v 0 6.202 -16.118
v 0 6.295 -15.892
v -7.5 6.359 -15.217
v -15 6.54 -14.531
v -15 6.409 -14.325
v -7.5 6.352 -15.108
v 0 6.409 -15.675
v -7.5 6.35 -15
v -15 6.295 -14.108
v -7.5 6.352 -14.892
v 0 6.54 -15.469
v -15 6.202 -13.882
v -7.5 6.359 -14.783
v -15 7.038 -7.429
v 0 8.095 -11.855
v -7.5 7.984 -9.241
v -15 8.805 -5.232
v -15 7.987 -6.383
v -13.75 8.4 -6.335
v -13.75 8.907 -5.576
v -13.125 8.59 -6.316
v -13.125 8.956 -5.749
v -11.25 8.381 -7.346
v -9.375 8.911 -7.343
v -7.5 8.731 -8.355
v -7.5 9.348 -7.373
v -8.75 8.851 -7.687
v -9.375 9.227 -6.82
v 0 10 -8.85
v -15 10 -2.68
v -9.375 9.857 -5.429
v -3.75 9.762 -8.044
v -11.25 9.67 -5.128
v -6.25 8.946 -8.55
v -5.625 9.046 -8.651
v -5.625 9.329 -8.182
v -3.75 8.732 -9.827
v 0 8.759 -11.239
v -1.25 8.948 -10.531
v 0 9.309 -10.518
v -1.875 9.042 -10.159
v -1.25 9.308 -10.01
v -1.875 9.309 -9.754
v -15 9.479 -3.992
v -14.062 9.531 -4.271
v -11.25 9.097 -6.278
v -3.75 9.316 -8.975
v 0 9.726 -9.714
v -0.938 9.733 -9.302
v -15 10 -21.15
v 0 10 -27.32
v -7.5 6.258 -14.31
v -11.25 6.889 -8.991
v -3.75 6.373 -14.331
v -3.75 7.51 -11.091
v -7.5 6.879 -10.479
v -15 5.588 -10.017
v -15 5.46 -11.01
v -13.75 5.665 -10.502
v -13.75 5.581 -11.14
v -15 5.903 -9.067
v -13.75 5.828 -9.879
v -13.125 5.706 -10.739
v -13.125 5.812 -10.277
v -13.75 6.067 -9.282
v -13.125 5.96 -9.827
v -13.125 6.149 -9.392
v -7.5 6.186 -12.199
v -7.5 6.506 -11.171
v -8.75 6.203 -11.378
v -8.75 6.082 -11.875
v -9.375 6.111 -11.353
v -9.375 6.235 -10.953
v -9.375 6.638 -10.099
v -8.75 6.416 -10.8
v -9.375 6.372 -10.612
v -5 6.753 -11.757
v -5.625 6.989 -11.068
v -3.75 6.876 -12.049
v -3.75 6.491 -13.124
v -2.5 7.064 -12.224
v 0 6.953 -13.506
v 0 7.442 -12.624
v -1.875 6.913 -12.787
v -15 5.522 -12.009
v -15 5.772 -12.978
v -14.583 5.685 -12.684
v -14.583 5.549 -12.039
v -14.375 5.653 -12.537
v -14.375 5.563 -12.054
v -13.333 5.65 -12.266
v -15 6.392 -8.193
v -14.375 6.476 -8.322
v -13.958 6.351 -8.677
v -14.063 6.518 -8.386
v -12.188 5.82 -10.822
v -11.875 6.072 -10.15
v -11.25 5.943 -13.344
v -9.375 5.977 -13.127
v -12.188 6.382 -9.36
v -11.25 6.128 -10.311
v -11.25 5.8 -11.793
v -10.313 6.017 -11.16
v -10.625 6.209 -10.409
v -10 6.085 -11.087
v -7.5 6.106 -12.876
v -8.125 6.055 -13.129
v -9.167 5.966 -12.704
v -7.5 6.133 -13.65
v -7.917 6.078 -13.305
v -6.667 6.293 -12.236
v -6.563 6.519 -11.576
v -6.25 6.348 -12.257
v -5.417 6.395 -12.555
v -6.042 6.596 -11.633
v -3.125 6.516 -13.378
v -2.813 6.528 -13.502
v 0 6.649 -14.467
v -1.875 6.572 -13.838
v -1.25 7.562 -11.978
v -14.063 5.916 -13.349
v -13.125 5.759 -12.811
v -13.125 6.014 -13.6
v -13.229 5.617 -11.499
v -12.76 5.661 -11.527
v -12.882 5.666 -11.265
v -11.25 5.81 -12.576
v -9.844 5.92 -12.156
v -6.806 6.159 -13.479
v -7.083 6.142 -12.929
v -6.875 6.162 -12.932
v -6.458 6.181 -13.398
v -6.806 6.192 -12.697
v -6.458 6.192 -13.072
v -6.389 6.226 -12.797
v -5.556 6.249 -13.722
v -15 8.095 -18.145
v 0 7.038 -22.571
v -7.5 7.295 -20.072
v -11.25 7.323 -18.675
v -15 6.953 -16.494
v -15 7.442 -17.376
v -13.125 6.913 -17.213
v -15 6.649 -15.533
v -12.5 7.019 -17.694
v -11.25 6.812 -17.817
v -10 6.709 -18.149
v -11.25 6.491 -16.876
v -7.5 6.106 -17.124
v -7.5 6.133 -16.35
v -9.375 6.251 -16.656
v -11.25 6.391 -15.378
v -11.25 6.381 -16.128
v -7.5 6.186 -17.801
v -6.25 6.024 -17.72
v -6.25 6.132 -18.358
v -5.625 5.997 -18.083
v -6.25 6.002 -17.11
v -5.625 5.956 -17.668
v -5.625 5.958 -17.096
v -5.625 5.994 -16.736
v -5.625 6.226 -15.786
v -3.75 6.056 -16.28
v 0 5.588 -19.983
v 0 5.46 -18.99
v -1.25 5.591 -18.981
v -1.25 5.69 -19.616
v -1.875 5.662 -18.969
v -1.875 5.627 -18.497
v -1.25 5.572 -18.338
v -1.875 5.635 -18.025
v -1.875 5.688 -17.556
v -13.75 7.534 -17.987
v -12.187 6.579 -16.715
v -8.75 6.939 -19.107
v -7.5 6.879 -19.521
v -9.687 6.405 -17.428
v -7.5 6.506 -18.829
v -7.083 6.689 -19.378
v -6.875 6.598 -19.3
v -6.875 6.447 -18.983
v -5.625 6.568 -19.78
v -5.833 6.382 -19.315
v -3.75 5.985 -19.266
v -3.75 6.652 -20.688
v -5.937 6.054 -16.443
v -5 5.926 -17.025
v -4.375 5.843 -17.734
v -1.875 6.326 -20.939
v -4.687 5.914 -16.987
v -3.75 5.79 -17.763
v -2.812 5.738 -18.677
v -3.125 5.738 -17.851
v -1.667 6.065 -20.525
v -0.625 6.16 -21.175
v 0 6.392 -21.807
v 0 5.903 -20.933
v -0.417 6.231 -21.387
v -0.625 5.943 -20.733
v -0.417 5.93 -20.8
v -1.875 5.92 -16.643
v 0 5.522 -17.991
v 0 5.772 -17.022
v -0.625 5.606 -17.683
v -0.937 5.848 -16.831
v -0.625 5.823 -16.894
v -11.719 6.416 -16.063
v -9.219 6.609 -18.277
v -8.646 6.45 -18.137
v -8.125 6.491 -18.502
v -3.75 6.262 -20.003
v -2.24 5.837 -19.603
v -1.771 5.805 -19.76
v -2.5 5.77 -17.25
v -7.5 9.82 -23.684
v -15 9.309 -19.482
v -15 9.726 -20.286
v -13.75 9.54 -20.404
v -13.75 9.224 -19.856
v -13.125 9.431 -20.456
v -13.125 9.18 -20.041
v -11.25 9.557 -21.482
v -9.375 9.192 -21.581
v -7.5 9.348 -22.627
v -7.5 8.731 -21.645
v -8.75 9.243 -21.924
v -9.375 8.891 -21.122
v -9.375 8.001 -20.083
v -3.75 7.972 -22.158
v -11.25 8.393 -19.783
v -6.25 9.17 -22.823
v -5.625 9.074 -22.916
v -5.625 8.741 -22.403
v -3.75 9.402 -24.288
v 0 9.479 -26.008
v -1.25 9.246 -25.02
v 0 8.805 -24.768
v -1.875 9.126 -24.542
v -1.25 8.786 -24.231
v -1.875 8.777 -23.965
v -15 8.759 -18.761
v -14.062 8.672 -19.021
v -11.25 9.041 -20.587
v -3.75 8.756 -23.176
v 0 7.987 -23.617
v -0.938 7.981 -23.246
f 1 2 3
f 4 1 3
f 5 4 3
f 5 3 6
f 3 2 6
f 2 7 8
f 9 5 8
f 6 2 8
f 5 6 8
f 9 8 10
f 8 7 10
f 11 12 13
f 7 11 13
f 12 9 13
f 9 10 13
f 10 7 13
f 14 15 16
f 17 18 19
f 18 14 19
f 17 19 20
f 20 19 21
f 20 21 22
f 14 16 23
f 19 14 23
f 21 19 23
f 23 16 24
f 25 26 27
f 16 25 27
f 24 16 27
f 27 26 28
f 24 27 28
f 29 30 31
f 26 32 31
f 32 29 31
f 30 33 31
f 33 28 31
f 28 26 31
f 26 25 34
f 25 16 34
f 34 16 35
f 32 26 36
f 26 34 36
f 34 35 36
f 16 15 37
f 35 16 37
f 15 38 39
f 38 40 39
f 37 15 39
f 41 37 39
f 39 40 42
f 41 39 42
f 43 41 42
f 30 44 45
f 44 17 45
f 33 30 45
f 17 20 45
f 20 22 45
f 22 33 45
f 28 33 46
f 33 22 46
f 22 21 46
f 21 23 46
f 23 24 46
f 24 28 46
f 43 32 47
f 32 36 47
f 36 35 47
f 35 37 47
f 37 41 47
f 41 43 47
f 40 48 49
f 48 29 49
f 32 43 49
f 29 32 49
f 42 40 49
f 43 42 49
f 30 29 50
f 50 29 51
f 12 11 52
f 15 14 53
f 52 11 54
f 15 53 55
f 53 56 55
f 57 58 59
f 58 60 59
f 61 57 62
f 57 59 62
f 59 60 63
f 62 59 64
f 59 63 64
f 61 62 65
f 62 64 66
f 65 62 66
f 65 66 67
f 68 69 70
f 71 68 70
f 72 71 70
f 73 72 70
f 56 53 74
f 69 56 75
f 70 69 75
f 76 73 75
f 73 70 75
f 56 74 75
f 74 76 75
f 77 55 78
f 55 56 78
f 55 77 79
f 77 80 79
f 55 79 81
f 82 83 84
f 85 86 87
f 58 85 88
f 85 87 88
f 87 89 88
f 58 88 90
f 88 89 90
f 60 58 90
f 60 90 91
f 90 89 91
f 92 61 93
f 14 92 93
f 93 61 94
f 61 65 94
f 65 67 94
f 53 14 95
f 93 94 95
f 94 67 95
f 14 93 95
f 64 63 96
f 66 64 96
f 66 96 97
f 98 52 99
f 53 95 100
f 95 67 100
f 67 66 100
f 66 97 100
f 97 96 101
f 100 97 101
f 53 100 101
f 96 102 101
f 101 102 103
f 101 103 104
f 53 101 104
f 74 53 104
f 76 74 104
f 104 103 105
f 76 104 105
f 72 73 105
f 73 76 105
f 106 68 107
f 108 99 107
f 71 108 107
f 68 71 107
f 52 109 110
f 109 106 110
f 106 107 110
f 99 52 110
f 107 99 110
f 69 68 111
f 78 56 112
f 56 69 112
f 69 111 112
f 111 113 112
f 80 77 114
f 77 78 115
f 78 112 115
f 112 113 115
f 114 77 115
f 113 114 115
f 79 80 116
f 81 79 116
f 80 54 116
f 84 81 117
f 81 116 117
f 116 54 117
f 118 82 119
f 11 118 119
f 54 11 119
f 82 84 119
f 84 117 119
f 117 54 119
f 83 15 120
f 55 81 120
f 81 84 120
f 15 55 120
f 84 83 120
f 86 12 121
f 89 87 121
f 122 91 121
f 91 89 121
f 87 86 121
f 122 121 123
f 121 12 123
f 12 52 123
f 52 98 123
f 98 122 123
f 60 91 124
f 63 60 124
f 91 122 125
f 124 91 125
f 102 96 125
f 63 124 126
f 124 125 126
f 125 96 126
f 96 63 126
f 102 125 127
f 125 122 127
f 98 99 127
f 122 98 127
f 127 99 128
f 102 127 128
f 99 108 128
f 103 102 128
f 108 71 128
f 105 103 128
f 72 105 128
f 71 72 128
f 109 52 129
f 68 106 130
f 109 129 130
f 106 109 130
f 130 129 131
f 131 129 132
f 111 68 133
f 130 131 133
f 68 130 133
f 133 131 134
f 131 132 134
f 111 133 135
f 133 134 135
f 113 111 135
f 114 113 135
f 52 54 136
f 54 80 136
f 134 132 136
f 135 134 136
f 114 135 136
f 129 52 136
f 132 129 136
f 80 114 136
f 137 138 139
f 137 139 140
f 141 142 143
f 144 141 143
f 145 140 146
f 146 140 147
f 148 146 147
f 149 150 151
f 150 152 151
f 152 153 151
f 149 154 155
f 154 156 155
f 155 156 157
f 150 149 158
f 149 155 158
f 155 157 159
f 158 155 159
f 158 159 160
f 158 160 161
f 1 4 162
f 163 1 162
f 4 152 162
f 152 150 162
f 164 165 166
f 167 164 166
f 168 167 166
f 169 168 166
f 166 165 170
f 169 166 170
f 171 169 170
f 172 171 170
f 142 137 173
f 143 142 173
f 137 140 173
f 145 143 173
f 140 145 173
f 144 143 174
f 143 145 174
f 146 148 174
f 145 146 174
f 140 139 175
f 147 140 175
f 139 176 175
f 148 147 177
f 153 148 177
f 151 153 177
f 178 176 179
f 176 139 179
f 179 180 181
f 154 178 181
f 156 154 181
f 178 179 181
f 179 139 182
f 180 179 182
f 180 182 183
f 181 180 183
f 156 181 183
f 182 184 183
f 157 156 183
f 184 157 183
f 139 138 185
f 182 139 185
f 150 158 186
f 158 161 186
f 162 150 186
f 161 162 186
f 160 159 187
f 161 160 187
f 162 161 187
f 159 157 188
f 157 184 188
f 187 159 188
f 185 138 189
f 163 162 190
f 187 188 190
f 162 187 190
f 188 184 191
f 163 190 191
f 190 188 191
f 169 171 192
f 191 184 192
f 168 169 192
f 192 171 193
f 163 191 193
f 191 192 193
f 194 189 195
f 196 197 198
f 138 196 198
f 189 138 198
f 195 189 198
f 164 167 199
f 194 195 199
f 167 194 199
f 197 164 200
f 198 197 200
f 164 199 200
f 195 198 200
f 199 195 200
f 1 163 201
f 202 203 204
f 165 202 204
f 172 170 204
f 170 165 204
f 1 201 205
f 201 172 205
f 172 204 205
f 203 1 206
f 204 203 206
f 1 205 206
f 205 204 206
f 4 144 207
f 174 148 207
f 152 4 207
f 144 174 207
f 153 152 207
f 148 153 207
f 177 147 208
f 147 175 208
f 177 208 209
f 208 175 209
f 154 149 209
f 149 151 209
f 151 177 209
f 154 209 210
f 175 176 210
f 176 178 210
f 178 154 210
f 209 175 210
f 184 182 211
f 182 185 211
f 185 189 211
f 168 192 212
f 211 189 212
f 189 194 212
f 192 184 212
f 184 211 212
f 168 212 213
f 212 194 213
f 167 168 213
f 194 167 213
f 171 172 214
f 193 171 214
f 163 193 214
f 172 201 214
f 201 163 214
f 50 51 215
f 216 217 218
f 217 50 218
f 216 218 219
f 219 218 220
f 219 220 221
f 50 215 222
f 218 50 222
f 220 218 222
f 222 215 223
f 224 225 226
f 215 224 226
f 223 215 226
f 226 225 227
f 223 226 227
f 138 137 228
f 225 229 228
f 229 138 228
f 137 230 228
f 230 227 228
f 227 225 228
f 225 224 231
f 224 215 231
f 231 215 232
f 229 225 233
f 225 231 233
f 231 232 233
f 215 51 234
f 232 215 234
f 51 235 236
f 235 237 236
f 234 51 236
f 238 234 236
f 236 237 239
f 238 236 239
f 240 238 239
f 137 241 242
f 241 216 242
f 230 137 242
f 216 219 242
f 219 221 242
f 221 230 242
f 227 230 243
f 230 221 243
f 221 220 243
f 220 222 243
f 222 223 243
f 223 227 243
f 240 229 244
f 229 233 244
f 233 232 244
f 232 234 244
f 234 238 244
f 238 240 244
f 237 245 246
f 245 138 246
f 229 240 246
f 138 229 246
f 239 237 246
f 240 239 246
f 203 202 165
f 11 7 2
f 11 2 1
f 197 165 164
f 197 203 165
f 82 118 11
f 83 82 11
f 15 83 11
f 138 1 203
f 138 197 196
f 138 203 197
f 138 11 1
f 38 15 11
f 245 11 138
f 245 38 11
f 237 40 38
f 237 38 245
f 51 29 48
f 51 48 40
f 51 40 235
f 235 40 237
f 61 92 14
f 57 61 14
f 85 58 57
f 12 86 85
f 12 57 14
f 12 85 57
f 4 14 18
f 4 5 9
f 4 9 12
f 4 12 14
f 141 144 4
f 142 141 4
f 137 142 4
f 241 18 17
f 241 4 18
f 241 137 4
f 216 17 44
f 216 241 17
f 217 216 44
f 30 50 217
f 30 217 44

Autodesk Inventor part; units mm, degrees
ref_plane "YZ Plane" through (0, 0, 0) normal (1, 0, 0) x (0, 1, 0)
ref_plane "XZ Plane" through (0, 0, 0) normal (0, 1, 0) x (-1, 0, 0)
ref_plane "XY Plane" through (0, 0, 0) normal (0, 0, 1) x (1, 0, 0)
sketch "Sketch1" plane through (0, 0, 0) normal (0, 1, 0) x (-1, 0, 0)
  line L0 (0, 0) -> (15, 0)
  line L1 (15, 0) -> (15, -30)
  line L2 (15, -30) -> (0, -30)
  line L3 (0, -30) -> (0, 0)
  dimension "d0" = 15
  dimension "d1" = 30
extrude "Extrusion1" add sketch "Sketch1" along normal blind 10
sketch "Sketch5" plane through (0, 0, 0) normal (1, 0, 0) x (0, 0, -1)
  line L0 (30, 10) -> (0, 10)
  arc A0 (11.8554, 8.0947) -> (8.8495, 10) centre (7.6947, 4.8542) ccw
  arc A1 (11.8554, 8.0947) -> (15.4691, 6.5404) centre (15.5119, 11.6182) ccw
  arc A2 (15.4691, 6.5404) -> (16.1182, 6.2019) centre (17.0614, 8.802) ccw
  arc A3 (16.1182, 6.2019) -> (22.5713, 7.0384) centre (18.8148, 10.7083) ccw
  arc A4 (27.3203, 10) -> (22.5713, 7.0384) centre (31.0109, -1.2064) ccw
  line L1 (27.3203, 10) -> (8.8495, 10)
  point P0 (0, 0)
  point P1 (0, 0)
  dimension "d14" = 2.6797
  dimension "d15" = 8.8495
sketch "Sketch6" plane through (-15, 0, -30) normal (-1, 0, 0) x (0, 0, 1)
  line L0 (30, 10) -> (0, 10)
  arc A0 (11.8554, 8.0947) -> (8.8495, 10) centre (7.6947, 4.8542) ccw
  arc A1 (11.8554, 8.0947) -> (15.4691, 6.5404) centre (15.5119, 11.6182) ccw
  arc A2 (15.4691, 6.5404) -> (16.1182, 6.2019) centre (17.0614, 8.802) ccw
  arc A3 (16.1182, 6.2019) -> (22.5713, 7.0384) centre (18.8148, 10.7083) ccw
  arc A4 (27.3203, 10) -> (22.5713, 7.0384) centre (31.0109, -1.2064) ccw
  line L1 (27.3203, 10) -> (8.8495, 10)
  point P0 (30, 0)
  point P1 (0, 0)
  point P2 (0, 0)
  dimension "d16" = 2.6797
  dimension "d17" = 8.8495
loft "Loft2" cut profiles "Sketch6", "Sketch5" keep common part
properties part number "crazy_test_2_fill"
